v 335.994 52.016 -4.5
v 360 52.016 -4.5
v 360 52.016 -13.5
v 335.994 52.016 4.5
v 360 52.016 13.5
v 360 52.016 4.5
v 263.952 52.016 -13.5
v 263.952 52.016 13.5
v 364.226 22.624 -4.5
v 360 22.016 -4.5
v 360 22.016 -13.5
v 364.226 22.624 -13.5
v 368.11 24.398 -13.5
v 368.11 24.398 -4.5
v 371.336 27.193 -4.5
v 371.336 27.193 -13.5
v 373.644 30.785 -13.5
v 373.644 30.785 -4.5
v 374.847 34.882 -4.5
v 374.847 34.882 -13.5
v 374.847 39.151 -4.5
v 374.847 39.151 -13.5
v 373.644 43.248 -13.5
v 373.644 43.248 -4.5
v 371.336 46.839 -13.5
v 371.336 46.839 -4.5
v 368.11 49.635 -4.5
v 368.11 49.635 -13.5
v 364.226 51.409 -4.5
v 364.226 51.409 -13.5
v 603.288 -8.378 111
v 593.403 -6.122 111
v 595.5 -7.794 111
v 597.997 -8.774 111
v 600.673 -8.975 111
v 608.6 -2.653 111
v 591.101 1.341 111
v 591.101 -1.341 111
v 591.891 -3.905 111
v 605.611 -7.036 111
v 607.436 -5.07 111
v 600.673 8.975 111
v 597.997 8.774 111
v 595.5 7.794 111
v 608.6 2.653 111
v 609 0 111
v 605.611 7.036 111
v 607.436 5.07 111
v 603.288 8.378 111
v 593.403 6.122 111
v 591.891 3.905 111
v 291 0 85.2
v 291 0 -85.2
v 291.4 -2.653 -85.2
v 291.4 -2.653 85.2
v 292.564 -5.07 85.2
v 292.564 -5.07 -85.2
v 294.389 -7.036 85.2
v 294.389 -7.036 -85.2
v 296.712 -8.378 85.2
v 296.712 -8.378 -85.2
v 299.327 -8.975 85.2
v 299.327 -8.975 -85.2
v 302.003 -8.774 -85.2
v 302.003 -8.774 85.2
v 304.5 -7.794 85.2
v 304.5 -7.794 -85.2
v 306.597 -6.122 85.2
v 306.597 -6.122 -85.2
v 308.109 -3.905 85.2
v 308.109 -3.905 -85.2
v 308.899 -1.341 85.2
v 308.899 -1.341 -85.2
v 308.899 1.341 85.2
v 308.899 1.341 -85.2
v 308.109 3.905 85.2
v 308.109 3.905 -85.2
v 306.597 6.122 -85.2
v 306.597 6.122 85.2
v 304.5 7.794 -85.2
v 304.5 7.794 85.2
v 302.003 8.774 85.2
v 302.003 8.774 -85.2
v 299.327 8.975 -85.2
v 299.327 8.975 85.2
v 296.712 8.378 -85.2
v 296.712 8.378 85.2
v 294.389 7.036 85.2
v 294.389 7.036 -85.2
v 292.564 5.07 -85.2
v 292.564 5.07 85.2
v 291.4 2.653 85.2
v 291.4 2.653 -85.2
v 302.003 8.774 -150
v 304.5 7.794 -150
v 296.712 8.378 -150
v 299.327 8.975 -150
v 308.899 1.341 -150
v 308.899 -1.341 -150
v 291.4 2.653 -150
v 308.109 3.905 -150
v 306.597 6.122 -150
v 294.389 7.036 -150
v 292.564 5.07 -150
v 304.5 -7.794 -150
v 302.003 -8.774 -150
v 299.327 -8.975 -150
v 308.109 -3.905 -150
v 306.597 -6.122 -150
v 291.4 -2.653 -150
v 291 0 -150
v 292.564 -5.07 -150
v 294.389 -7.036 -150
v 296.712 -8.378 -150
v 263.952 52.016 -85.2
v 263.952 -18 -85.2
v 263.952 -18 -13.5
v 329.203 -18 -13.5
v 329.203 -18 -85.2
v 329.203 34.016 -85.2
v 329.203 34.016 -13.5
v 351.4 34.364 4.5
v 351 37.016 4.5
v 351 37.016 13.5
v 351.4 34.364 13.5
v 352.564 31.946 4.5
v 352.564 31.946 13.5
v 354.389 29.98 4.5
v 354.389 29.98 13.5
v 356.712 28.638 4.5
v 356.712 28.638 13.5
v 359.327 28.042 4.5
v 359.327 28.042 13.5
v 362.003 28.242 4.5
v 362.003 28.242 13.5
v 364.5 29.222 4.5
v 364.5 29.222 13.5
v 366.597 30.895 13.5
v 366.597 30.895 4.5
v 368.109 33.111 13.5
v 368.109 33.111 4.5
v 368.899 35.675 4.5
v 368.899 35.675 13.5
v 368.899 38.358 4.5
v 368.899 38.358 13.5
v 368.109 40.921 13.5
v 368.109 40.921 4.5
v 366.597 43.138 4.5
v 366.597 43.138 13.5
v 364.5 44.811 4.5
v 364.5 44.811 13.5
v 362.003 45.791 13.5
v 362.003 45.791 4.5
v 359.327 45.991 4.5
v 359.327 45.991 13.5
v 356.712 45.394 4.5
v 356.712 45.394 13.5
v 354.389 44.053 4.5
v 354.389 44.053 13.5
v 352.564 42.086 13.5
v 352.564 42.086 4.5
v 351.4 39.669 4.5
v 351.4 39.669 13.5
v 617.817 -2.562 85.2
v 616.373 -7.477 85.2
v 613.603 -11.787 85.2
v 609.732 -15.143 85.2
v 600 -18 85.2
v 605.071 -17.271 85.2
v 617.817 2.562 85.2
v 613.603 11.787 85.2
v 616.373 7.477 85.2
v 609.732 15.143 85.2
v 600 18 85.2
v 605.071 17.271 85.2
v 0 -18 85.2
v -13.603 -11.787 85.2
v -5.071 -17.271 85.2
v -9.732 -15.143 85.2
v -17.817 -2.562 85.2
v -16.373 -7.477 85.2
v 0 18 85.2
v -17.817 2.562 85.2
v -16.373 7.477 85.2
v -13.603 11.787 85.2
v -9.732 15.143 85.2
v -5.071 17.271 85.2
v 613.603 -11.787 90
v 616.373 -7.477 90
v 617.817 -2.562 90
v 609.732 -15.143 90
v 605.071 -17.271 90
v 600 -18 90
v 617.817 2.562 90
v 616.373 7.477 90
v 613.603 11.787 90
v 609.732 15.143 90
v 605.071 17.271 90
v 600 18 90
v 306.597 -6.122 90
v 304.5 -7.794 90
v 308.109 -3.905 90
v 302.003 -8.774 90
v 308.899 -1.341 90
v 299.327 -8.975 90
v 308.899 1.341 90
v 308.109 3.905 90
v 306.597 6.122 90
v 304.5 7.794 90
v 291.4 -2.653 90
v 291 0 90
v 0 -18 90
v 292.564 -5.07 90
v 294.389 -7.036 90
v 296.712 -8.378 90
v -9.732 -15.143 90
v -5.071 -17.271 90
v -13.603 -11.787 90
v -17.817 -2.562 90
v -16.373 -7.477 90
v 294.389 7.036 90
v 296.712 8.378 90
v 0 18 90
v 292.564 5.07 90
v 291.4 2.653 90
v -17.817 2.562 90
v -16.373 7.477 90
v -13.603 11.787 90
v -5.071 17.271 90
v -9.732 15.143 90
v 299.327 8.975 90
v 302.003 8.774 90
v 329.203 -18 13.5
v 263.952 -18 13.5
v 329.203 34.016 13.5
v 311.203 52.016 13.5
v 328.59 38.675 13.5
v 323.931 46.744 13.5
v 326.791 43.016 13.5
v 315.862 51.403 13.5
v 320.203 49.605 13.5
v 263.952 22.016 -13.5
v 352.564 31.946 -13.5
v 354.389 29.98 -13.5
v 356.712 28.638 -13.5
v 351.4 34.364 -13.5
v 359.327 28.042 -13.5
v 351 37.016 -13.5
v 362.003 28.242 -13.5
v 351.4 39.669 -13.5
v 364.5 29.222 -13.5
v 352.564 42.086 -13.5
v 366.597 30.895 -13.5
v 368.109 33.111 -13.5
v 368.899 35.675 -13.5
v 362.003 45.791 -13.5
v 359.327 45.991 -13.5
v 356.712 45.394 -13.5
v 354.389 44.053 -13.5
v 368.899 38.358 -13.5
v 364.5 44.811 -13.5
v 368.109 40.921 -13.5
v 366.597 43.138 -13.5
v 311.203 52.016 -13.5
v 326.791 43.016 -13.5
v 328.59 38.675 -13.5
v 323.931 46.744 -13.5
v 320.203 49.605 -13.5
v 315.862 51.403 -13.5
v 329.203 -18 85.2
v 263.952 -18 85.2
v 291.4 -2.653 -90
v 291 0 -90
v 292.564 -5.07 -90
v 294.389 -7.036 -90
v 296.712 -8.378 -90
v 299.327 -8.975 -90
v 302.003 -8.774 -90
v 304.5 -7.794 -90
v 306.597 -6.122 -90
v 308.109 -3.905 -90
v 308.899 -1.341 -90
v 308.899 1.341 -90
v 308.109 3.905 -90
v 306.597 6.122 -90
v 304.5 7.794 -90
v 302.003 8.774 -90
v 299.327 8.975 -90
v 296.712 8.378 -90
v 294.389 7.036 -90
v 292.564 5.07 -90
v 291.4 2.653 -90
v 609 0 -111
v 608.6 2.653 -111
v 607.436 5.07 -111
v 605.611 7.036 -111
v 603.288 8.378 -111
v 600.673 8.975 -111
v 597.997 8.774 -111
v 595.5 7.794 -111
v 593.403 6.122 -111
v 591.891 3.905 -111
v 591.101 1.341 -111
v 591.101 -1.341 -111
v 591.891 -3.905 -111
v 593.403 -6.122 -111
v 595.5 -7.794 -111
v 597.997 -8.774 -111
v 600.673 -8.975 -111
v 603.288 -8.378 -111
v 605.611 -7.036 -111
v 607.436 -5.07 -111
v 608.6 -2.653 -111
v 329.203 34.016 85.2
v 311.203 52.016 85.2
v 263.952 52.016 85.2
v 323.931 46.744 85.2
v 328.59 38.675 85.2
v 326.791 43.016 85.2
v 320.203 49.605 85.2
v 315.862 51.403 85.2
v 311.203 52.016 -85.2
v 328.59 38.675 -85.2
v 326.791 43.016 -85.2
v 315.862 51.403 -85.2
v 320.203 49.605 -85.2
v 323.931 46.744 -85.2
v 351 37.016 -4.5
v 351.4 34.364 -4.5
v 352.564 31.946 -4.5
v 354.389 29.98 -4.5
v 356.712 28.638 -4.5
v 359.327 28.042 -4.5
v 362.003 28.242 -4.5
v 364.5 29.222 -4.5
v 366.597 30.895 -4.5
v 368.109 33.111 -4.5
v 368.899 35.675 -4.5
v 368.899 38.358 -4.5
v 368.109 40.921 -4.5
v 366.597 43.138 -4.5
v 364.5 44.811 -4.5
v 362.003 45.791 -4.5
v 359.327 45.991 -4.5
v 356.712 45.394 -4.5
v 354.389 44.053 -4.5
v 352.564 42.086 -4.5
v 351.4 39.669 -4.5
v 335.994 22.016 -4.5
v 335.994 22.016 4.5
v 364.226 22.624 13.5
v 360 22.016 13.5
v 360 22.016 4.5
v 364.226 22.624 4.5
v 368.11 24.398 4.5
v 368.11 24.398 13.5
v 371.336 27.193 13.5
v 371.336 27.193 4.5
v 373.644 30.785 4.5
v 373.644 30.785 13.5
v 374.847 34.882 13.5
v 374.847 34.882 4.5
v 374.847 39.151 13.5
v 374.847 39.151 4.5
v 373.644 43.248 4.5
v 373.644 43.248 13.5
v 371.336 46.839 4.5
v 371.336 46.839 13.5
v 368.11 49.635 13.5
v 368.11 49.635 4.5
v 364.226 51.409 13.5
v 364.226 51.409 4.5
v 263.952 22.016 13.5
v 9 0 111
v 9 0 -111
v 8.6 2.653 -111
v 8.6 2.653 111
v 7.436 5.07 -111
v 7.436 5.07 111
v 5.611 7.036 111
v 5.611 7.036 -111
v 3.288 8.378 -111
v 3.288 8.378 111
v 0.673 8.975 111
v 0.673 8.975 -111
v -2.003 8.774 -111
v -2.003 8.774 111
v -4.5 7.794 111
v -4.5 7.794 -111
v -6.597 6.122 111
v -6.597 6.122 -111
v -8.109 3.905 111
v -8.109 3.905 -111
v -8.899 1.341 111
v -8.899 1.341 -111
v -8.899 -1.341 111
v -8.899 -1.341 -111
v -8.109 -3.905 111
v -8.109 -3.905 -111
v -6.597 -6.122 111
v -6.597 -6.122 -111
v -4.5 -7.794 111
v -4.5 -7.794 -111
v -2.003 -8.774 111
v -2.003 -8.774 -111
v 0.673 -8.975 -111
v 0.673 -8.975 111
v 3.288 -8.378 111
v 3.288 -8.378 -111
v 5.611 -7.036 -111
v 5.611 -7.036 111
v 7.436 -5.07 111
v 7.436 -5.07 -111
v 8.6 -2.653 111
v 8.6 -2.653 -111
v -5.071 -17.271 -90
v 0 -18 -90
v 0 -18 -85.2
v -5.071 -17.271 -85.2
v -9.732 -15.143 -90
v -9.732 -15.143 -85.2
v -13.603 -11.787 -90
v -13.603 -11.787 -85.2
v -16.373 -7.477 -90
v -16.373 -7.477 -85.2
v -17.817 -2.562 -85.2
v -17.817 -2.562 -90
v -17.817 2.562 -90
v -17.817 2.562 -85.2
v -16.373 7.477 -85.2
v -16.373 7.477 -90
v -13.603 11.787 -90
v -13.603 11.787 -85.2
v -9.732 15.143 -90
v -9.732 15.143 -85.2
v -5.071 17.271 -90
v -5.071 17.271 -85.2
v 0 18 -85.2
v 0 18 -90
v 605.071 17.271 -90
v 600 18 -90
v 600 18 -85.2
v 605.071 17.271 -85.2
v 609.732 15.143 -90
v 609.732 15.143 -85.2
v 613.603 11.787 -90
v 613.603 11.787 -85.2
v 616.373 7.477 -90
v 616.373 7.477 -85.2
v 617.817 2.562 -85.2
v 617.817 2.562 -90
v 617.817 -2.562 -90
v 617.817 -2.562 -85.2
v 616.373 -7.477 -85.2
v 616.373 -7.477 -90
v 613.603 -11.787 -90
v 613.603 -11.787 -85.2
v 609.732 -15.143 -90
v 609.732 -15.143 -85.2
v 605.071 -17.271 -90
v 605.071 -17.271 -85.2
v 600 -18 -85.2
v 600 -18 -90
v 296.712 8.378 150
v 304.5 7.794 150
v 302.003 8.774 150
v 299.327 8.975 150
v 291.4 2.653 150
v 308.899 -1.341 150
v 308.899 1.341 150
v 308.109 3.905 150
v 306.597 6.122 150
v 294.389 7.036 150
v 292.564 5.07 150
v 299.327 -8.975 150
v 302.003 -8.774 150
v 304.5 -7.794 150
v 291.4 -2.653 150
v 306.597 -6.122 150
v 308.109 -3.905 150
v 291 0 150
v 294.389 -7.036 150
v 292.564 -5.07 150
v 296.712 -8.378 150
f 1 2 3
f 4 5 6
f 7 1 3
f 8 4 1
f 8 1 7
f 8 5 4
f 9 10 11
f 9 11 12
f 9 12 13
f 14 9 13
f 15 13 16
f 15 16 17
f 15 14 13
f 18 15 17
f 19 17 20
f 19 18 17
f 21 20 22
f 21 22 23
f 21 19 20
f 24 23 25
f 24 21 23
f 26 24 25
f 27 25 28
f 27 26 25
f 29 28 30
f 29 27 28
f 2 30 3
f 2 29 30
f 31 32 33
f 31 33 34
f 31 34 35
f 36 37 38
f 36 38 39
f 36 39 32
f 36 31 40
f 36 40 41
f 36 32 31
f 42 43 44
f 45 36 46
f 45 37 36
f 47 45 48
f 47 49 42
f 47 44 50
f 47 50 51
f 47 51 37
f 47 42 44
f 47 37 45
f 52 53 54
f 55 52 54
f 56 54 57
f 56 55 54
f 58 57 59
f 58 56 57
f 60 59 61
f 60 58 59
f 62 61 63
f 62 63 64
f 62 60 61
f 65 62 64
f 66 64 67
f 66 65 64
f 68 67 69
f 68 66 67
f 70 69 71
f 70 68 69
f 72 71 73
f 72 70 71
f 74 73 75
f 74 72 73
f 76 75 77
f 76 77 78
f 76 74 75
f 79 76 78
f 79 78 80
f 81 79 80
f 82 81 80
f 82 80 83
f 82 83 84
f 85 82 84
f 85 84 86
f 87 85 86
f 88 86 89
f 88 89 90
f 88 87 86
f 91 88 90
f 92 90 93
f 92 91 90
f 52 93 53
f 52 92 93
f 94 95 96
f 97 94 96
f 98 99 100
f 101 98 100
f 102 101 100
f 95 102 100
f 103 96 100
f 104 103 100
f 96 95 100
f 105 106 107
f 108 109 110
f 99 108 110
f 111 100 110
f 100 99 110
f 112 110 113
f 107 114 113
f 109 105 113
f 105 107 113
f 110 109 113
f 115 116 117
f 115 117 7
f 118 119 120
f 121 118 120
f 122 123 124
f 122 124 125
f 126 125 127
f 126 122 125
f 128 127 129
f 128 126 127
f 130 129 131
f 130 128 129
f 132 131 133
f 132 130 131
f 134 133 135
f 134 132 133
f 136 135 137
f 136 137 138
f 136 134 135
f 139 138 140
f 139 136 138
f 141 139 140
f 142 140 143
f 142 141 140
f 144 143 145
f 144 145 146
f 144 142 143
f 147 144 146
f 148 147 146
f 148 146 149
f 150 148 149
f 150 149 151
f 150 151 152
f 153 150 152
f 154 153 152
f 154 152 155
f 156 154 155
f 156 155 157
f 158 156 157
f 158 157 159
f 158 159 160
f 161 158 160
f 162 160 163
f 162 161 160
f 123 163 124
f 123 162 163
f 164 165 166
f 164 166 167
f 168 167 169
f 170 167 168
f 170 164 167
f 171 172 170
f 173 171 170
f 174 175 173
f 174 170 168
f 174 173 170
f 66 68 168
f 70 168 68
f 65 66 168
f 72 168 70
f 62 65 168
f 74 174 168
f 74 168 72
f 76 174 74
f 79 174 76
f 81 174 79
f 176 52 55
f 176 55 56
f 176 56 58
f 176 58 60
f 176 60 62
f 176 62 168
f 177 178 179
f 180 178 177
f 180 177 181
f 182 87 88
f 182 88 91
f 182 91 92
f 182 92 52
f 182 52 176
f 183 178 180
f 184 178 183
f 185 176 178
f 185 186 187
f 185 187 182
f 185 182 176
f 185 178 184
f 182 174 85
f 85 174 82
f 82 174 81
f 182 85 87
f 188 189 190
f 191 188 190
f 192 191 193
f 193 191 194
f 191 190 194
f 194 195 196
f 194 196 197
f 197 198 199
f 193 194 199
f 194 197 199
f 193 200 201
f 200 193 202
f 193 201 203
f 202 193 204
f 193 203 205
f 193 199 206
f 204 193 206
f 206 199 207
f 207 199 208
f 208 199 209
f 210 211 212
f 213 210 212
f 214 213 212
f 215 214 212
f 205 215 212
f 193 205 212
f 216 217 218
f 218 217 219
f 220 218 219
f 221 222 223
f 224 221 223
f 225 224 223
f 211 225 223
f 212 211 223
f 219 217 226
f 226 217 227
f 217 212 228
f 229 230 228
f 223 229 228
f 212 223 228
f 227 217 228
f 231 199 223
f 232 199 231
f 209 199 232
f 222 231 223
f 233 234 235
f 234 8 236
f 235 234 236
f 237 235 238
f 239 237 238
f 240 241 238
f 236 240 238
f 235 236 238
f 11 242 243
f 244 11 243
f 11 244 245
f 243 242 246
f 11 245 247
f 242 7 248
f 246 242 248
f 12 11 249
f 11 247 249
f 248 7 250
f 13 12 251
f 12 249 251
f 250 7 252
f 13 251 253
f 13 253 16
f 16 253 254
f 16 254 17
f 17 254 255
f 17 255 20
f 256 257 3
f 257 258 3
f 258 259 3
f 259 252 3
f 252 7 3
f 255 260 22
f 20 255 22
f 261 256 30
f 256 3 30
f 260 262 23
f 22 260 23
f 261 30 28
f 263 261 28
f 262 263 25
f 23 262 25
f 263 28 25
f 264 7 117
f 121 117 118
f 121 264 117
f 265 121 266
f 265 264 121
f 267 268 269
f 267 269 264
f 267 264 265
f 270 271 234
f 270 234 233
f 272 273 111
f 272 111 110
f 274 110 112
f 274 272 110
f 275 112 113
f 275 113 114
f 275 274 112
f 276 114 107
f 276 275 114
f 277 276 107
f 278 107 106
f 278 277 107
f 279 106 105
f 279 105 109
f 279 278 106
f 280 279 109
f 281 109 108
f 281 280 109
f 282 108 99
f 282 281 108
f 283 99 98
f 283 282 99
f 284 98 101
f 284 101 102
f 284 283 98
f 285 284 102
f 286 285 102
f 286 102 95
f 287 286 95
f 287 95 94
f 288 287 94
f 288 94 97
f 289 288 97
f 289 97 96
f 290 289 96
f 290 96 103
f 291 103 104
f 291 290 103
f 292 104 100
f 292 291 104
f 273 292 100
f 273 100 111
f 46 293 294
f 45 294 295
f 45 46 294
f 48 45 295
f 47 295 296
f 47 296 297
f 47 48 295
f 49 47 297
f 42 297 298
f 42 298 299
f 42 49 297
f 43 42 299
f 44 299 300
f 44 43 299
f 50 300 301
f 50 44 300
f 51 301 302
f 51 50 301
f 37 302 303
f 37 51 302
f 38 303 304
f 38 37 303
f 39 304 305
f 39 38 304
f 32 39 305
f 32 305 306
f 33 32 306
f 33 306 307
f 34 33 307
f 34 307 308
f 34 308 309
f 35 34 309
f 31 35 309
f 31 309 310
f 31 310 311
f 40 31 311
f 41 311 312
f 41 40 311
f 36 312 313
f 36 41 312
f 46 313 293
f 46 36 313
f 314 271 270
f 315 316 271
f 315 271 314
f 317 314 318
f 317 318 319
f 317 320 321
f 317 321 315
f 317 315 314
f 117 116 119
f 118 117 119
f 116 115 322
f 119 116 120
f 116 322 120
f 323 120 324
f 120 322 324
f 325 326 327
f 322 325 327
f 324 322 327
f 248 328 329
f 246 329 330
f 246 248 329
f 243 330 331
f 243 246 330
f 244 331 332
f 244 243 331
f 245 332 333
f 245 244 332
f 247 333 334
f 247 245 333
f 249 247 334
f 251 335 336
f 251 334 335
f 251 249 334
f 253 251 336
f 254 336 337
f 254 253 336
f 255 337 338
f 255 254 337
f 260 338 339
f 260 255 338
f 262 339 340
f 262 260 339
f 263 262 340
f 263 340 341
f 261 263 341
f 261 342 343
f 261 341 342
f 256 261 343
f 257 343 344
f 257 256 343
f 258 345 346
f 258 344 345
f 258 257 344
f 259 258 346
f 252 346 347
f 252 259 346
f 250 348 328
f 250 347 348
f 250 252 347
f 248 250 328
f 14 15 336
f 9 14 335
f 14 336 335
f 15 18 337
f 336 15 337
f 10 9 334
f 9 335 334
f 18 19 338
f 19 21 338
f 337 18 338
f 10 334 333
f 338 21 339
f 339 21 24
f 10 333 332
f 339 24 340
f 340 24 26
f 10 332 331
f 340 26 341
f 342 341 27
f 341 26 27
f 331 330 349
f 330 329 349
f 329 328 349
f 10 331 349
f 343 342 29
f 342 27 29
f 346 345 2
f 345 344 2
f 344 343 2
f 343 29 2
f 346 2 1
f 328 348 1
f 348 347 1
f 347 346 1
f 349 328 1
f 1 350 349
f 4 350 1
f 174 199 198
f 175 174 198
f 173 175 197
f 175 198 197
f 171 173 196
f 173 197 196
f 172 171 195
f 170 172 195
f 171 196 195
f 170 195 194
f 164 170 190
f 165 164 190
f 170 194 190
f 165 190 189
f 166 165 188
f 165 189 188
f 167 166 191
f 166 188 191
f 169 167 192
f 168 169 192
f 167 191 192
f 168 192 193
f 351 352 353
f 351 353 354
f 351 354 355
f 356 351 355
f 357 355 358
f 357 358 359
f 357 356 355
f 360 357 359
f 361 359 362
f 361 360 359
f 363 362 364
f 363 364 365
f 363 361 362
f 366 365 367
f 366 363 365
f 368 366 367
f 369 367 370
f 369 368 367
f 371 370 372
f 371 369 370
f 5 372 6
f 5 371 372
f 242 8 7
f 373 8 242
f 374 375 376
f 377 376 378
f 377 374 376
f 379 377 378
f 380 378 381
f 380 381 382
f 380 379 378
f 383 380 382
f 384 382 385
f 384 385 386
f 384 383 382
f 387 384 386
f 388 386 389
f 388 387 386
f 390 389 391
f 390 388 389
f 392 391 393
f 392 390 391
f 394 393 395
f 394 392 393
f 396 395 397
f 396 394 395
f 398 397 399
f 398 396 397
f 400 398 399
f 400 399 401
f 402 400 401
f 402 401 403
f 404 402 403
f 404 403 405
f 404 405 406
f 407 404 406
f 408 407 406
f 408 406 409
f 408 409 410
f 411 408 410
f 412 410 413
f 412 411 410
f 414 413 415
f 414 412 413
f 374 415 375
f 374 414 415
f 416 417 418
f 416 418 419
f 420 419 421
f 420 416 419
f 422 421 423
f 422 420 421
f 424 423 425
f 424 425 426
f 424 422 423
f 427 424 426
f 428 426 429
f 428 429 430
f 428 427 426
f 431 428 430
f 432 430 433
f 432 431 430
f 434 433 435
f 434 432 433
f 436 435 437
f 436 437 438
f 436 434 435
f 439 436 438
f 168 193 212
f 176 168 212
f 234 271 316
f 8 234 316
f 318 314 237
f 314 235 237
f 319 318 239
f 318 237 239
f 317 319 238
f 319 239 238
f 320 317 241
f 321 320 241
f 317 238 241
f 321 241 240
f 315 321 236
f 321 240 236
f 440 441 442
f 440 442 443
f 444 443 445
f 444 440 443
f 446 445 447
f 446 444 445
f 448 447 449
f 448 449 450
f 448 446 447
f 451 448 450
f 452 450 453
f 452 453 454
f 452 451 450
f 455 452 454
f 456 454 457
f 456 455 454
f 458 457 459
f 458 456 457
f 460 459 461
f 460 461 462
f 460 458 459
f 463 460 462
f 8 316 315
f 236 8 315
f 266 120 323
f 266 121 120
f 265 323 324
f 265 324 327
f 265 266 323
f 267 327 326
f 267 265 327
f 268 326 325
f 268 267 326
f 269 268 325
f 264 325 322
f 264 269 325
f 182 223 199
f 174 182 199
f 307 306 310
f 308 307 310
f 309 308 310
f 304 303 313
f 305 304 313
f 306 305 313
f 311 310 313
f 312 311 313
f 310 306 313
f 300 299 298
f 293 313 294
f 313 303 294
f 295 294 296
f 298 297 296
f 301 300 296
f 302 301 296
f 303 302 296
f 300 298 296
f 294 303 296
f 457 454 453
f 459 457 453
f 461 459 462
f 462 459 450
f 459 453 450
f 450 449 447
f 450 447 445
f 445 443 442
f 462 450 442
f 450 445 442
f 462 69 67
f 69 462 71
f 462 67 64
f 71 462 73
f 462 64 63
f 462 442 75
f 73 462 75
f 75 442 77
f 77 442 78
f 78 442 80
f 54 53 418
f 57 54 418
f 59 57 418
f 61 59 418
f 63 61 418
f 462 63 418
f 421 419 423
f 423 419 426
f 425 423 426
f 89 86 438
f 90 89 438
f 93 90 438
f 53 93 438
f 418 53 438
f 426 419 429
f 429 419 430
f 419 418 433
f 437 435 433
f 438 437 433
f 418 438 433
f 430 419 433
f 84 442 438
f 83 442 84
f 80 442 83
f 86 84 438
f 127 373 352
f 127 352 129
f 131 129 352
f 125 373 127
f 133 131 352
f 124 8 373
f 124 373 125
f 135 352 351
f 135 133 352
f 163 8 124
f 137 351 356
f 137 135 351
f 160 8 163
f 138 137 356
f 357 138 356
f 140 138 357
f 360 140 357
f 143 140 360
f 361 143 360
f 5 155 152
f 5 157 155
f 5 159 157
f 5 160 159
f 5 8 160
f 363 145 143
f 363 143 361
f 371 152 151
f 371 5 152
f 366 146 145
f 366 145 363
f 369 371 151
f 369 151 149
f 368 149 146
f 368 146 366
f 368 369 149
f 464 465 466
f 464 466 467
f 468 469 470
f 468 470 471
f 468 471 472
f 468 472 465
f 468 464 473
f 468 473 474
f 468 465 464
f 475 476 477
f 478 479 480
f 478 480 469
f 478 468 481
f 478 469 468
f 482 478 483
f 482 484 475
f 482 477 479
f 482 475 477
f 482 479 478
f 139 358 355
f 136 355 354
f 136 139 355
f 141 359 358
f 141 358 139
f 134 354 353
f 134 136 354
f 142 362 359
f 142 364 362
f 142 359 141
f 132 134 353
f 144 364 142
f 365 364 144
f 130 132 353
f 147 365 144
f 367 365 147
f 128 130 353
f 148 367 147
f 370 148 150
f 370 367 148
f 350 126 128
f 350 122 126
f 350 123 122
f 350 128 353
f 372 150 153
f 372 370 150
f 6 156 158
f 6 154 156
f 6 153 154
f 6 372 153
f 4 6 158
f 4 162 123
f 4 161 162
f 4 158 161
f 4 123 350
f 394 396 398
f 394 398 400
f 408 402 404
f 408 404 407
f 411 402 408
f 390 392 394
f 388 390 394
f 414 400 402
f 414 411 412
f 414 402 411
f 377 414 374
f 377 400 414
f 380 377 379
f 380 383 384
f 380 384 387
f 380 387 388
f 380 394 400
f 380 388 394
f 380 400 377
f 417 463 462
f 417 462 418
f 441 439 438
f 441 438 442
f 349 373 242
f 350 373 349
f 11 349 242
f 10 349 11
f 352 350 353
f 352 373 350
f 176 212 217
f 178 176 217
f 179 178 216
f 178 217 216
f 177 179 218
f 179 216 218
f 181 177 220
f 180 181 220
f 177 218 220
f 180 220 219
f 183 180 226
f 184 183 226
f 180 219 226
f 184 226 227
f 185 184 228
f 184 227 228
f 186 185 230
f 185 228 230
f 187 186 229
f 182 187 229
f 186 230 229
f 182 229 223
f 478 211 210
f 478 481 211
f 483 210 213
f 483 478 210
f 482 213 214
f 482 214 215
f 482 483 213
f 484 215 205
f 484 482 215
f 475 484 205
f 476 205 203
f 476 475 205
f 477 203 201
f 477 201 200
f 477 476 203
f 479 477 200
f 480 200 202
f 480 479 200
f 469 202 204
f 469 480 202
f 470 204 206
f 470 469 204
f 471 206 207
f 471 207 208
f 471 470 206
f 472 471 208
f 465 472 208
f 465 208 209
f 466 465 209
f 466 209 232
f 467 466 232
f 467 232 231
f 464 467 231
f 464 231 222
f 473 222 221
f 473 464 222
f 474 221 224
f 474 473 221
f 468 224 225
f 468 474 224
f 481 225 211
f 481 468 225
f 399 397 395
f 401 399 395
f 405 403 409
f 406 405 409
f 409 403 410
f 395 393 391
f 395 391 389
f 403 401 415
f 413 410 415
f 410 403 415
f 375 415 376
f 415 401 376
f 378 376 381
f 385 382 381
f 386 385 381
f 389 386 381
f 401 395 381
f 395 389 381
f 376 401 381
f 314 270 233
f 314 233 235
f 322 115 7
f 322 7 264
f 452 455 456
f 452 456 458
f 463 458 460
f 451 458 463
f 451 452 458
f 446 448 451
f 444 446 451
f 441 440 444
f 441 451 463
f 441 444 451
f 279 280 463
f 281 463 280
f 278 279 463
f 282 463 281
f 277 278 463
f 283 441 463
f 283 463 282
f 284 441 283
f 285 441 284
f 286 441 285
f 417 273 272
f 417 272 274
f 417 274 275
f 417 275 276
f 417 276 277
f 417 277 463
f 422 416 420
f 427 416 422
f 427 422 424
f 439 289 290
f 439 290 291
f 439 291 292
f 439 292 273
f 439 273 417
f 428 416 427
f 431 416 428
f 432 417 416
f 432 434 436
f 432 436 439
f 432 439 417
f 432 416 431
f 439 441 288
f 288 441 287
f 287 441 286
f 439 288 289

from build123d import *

# Parameters (mm, degrees)
SKETCH_1_R          = 15
EXTRUDE_1_DEPTH     = 185
EXTRUDE_1_2_DEPTH   = 185
EXTRUDE_2_DEPTH     = 8
SKETCH_3_R          = 15
EXTRUDE_3_DEPTH     = 250
SKETCH_5_R          = 15
EXTRUDE_4_DEPTH     = 22.5
SKETCH_6_W          = 108.750714941
SKETCH_6_H          = 116.693894846
EXTRUDE_5_DEPTH     = 119.5
FILLET_1_R          = 30
FILLET_2_R          = 30
CUT_EXTRUDE_2_DEPTH = 7.5
SCALE_1_SCALE       = 0.6


with BuildPart() as part:
    # 草图1 → 凸台-拉伸1 (new, symmetric)
    with BuildSketch(Plane.XY):
        Circle(SKETCH_1_R)
    extrude(amount=EXTRUDE_1_DEPTH, both=True)


with BuildPart() as body_2:
    # 草图1 → Extrude 1 2 (new, symmetric)
    with BuildSketch(Plane.XY):
        with Locations((1000, 0)):
            Circle(SKETCH_1_R)
    extrude(amount=EXTRUDE_1_2_DEPTH, both=True)


with BuildPart() as body_3:
    # 草图2 → 凸台-拉伸2 (new body)
    with BuildSketch(Plane.XY.offset(150)):
        with BuildLine():
            Line((0, 30), (1000, 30))
            ThreePointArc((1000, 30), (1030, 0), (1000, -30))
            Line((1000, -30), (0, -30))
            ThreePointArc((0, -30), (-30, 0), (0, 30))
        make_face()
    extrude(amount=-EXTRUDE_2_DEPTH)


with BuildPart() as body_4:
    # 镜向1: mirrored copy
    add(body_3.part.mirror(Plane.XY))


with BuildPart() as body_3_1:
    add(body_3.part)

    add(body_4.part)  # 凸台-拉伸3 merges body 4
    # 草图3 → 凸台-拉伸3 (add, symmetric)
    with BuildSketch(Plane.XY):
        with Locations(Location((500, 0, 0), (0, 0, 180))):
            Circle(SKETCH_3_R)
    extrude(amount=EXTRUDE_3_DEPTH, both=True)


with BuildPart() as body_4_2:
    # 草图5 → 凸台-拉伸4 (new, symmetric)
    with BuildSketch(Plane.XY):
        with BuildLine():
            Line((600, 86.693894846), (439.920801344, 86.693894846))
            Line((439.920801344, 86.693894846), (439.920801344, 36.693894846))
            Line((439.920801344, 36.693894846), (600, 36.693894846))
            ThreePointArc((600, 36.693894846), (625, 61.693894846), (600, 86.693894846))
        make_face()
        with Locations(Location((600, 61.693894846, 0), (0, 0, 180))):
            Circle(SKETCH_5_R, mode=Mode.SUBTRACT)
    extrude(amount=EXTRUDE_4_DEPTH, both=True)

    # 草图9 → 切除-拉伸2 (cut, symmetric)
    with BuildSketch(Plane.XY):
        Polygon((600, 86.693894846), (630.258181454, 86.693894846), (630.258181454, 36.693894846), (600, 36.693894846), (559.990536036, 36.693894846), (559.990536036, 86.693894846), align=None)
    extrude(amount=CUT_EXTRUDE_2_DEPTH, both=True, mode=Mode.SUBTRACT)


with BuildPart() as body_5:
    # 草图6 → 凸台-拉伸5 (new body)
    with BuildSketch(Plane.XY.offset(-142)):
        with Locations((494.296158815, 28.346947423)):
            Rectangle(SKETCH_6_W, SKETCH_6_H)
    extrude(amount=EXTRUDE_5_DEPTH)


with BuildPart() as body_6:
    # 镜向2: mirrored copy
    add(body_5.part.mirror(Plane.XY))

    # 圆角2
    fillet_2_edges = [body_6.edges().sort_by_distance(p)[0] for p in [
        (548.671516285, 86.693894846, 82.25),
    ]]
    fillet(fillet_2_edges, radius=FILLET_2_R)


with BuildPart() as body_5_1:
    add(body_5.part)

    # 圆角1
    fillet_1_edges = [body_5_1.edges().sort_by_distance(p)[0] for p in [
        (548.671516285, 86.693894846, -82.25),
    ]]
    fillet(fillet_1_edges, radius=FILLET_1_R)


with BuildPart() as part_1:
    # 缩放比例1: scaled about (0, 0, 0)
    add(part.part.scale(SCALE_1_SCALE))


with BuildPart() as body_2_1:
    # 缩放比例1: scaled about (0, 0, 0)
    add(body_2.part.scale(SCALE_1_SCALE))


with BuildPart() as body_3_2:
    # 缩放比例1: scaled about (0, 0, 0)
    add(body_3_1.part.scale(SCALE_1_SCALE))


with BuildPart() as body_5_2:
    # 缩放比例1: scaled about (0, 0, 0)
    add(body_5_1.part.scale(SCALE_1_SCALE))


with BuildPart() as body_6_1:
    # 缩放比例1: scaled about (0, 0, 0)
    add(body_6.part.scale(SCALE_1_SCALE))


with BuildPart() as body_4_2_1:
    # 缩放比例1: scaled about (0, 0, 0)
    add(body_4_2.part.scale(SCALE_1_SCALE))


solid = Compound([part_1.part, body_2_1.part, body_3_2.part, body_5_2.part, body_6_1.part, body_4_2_1.part])
